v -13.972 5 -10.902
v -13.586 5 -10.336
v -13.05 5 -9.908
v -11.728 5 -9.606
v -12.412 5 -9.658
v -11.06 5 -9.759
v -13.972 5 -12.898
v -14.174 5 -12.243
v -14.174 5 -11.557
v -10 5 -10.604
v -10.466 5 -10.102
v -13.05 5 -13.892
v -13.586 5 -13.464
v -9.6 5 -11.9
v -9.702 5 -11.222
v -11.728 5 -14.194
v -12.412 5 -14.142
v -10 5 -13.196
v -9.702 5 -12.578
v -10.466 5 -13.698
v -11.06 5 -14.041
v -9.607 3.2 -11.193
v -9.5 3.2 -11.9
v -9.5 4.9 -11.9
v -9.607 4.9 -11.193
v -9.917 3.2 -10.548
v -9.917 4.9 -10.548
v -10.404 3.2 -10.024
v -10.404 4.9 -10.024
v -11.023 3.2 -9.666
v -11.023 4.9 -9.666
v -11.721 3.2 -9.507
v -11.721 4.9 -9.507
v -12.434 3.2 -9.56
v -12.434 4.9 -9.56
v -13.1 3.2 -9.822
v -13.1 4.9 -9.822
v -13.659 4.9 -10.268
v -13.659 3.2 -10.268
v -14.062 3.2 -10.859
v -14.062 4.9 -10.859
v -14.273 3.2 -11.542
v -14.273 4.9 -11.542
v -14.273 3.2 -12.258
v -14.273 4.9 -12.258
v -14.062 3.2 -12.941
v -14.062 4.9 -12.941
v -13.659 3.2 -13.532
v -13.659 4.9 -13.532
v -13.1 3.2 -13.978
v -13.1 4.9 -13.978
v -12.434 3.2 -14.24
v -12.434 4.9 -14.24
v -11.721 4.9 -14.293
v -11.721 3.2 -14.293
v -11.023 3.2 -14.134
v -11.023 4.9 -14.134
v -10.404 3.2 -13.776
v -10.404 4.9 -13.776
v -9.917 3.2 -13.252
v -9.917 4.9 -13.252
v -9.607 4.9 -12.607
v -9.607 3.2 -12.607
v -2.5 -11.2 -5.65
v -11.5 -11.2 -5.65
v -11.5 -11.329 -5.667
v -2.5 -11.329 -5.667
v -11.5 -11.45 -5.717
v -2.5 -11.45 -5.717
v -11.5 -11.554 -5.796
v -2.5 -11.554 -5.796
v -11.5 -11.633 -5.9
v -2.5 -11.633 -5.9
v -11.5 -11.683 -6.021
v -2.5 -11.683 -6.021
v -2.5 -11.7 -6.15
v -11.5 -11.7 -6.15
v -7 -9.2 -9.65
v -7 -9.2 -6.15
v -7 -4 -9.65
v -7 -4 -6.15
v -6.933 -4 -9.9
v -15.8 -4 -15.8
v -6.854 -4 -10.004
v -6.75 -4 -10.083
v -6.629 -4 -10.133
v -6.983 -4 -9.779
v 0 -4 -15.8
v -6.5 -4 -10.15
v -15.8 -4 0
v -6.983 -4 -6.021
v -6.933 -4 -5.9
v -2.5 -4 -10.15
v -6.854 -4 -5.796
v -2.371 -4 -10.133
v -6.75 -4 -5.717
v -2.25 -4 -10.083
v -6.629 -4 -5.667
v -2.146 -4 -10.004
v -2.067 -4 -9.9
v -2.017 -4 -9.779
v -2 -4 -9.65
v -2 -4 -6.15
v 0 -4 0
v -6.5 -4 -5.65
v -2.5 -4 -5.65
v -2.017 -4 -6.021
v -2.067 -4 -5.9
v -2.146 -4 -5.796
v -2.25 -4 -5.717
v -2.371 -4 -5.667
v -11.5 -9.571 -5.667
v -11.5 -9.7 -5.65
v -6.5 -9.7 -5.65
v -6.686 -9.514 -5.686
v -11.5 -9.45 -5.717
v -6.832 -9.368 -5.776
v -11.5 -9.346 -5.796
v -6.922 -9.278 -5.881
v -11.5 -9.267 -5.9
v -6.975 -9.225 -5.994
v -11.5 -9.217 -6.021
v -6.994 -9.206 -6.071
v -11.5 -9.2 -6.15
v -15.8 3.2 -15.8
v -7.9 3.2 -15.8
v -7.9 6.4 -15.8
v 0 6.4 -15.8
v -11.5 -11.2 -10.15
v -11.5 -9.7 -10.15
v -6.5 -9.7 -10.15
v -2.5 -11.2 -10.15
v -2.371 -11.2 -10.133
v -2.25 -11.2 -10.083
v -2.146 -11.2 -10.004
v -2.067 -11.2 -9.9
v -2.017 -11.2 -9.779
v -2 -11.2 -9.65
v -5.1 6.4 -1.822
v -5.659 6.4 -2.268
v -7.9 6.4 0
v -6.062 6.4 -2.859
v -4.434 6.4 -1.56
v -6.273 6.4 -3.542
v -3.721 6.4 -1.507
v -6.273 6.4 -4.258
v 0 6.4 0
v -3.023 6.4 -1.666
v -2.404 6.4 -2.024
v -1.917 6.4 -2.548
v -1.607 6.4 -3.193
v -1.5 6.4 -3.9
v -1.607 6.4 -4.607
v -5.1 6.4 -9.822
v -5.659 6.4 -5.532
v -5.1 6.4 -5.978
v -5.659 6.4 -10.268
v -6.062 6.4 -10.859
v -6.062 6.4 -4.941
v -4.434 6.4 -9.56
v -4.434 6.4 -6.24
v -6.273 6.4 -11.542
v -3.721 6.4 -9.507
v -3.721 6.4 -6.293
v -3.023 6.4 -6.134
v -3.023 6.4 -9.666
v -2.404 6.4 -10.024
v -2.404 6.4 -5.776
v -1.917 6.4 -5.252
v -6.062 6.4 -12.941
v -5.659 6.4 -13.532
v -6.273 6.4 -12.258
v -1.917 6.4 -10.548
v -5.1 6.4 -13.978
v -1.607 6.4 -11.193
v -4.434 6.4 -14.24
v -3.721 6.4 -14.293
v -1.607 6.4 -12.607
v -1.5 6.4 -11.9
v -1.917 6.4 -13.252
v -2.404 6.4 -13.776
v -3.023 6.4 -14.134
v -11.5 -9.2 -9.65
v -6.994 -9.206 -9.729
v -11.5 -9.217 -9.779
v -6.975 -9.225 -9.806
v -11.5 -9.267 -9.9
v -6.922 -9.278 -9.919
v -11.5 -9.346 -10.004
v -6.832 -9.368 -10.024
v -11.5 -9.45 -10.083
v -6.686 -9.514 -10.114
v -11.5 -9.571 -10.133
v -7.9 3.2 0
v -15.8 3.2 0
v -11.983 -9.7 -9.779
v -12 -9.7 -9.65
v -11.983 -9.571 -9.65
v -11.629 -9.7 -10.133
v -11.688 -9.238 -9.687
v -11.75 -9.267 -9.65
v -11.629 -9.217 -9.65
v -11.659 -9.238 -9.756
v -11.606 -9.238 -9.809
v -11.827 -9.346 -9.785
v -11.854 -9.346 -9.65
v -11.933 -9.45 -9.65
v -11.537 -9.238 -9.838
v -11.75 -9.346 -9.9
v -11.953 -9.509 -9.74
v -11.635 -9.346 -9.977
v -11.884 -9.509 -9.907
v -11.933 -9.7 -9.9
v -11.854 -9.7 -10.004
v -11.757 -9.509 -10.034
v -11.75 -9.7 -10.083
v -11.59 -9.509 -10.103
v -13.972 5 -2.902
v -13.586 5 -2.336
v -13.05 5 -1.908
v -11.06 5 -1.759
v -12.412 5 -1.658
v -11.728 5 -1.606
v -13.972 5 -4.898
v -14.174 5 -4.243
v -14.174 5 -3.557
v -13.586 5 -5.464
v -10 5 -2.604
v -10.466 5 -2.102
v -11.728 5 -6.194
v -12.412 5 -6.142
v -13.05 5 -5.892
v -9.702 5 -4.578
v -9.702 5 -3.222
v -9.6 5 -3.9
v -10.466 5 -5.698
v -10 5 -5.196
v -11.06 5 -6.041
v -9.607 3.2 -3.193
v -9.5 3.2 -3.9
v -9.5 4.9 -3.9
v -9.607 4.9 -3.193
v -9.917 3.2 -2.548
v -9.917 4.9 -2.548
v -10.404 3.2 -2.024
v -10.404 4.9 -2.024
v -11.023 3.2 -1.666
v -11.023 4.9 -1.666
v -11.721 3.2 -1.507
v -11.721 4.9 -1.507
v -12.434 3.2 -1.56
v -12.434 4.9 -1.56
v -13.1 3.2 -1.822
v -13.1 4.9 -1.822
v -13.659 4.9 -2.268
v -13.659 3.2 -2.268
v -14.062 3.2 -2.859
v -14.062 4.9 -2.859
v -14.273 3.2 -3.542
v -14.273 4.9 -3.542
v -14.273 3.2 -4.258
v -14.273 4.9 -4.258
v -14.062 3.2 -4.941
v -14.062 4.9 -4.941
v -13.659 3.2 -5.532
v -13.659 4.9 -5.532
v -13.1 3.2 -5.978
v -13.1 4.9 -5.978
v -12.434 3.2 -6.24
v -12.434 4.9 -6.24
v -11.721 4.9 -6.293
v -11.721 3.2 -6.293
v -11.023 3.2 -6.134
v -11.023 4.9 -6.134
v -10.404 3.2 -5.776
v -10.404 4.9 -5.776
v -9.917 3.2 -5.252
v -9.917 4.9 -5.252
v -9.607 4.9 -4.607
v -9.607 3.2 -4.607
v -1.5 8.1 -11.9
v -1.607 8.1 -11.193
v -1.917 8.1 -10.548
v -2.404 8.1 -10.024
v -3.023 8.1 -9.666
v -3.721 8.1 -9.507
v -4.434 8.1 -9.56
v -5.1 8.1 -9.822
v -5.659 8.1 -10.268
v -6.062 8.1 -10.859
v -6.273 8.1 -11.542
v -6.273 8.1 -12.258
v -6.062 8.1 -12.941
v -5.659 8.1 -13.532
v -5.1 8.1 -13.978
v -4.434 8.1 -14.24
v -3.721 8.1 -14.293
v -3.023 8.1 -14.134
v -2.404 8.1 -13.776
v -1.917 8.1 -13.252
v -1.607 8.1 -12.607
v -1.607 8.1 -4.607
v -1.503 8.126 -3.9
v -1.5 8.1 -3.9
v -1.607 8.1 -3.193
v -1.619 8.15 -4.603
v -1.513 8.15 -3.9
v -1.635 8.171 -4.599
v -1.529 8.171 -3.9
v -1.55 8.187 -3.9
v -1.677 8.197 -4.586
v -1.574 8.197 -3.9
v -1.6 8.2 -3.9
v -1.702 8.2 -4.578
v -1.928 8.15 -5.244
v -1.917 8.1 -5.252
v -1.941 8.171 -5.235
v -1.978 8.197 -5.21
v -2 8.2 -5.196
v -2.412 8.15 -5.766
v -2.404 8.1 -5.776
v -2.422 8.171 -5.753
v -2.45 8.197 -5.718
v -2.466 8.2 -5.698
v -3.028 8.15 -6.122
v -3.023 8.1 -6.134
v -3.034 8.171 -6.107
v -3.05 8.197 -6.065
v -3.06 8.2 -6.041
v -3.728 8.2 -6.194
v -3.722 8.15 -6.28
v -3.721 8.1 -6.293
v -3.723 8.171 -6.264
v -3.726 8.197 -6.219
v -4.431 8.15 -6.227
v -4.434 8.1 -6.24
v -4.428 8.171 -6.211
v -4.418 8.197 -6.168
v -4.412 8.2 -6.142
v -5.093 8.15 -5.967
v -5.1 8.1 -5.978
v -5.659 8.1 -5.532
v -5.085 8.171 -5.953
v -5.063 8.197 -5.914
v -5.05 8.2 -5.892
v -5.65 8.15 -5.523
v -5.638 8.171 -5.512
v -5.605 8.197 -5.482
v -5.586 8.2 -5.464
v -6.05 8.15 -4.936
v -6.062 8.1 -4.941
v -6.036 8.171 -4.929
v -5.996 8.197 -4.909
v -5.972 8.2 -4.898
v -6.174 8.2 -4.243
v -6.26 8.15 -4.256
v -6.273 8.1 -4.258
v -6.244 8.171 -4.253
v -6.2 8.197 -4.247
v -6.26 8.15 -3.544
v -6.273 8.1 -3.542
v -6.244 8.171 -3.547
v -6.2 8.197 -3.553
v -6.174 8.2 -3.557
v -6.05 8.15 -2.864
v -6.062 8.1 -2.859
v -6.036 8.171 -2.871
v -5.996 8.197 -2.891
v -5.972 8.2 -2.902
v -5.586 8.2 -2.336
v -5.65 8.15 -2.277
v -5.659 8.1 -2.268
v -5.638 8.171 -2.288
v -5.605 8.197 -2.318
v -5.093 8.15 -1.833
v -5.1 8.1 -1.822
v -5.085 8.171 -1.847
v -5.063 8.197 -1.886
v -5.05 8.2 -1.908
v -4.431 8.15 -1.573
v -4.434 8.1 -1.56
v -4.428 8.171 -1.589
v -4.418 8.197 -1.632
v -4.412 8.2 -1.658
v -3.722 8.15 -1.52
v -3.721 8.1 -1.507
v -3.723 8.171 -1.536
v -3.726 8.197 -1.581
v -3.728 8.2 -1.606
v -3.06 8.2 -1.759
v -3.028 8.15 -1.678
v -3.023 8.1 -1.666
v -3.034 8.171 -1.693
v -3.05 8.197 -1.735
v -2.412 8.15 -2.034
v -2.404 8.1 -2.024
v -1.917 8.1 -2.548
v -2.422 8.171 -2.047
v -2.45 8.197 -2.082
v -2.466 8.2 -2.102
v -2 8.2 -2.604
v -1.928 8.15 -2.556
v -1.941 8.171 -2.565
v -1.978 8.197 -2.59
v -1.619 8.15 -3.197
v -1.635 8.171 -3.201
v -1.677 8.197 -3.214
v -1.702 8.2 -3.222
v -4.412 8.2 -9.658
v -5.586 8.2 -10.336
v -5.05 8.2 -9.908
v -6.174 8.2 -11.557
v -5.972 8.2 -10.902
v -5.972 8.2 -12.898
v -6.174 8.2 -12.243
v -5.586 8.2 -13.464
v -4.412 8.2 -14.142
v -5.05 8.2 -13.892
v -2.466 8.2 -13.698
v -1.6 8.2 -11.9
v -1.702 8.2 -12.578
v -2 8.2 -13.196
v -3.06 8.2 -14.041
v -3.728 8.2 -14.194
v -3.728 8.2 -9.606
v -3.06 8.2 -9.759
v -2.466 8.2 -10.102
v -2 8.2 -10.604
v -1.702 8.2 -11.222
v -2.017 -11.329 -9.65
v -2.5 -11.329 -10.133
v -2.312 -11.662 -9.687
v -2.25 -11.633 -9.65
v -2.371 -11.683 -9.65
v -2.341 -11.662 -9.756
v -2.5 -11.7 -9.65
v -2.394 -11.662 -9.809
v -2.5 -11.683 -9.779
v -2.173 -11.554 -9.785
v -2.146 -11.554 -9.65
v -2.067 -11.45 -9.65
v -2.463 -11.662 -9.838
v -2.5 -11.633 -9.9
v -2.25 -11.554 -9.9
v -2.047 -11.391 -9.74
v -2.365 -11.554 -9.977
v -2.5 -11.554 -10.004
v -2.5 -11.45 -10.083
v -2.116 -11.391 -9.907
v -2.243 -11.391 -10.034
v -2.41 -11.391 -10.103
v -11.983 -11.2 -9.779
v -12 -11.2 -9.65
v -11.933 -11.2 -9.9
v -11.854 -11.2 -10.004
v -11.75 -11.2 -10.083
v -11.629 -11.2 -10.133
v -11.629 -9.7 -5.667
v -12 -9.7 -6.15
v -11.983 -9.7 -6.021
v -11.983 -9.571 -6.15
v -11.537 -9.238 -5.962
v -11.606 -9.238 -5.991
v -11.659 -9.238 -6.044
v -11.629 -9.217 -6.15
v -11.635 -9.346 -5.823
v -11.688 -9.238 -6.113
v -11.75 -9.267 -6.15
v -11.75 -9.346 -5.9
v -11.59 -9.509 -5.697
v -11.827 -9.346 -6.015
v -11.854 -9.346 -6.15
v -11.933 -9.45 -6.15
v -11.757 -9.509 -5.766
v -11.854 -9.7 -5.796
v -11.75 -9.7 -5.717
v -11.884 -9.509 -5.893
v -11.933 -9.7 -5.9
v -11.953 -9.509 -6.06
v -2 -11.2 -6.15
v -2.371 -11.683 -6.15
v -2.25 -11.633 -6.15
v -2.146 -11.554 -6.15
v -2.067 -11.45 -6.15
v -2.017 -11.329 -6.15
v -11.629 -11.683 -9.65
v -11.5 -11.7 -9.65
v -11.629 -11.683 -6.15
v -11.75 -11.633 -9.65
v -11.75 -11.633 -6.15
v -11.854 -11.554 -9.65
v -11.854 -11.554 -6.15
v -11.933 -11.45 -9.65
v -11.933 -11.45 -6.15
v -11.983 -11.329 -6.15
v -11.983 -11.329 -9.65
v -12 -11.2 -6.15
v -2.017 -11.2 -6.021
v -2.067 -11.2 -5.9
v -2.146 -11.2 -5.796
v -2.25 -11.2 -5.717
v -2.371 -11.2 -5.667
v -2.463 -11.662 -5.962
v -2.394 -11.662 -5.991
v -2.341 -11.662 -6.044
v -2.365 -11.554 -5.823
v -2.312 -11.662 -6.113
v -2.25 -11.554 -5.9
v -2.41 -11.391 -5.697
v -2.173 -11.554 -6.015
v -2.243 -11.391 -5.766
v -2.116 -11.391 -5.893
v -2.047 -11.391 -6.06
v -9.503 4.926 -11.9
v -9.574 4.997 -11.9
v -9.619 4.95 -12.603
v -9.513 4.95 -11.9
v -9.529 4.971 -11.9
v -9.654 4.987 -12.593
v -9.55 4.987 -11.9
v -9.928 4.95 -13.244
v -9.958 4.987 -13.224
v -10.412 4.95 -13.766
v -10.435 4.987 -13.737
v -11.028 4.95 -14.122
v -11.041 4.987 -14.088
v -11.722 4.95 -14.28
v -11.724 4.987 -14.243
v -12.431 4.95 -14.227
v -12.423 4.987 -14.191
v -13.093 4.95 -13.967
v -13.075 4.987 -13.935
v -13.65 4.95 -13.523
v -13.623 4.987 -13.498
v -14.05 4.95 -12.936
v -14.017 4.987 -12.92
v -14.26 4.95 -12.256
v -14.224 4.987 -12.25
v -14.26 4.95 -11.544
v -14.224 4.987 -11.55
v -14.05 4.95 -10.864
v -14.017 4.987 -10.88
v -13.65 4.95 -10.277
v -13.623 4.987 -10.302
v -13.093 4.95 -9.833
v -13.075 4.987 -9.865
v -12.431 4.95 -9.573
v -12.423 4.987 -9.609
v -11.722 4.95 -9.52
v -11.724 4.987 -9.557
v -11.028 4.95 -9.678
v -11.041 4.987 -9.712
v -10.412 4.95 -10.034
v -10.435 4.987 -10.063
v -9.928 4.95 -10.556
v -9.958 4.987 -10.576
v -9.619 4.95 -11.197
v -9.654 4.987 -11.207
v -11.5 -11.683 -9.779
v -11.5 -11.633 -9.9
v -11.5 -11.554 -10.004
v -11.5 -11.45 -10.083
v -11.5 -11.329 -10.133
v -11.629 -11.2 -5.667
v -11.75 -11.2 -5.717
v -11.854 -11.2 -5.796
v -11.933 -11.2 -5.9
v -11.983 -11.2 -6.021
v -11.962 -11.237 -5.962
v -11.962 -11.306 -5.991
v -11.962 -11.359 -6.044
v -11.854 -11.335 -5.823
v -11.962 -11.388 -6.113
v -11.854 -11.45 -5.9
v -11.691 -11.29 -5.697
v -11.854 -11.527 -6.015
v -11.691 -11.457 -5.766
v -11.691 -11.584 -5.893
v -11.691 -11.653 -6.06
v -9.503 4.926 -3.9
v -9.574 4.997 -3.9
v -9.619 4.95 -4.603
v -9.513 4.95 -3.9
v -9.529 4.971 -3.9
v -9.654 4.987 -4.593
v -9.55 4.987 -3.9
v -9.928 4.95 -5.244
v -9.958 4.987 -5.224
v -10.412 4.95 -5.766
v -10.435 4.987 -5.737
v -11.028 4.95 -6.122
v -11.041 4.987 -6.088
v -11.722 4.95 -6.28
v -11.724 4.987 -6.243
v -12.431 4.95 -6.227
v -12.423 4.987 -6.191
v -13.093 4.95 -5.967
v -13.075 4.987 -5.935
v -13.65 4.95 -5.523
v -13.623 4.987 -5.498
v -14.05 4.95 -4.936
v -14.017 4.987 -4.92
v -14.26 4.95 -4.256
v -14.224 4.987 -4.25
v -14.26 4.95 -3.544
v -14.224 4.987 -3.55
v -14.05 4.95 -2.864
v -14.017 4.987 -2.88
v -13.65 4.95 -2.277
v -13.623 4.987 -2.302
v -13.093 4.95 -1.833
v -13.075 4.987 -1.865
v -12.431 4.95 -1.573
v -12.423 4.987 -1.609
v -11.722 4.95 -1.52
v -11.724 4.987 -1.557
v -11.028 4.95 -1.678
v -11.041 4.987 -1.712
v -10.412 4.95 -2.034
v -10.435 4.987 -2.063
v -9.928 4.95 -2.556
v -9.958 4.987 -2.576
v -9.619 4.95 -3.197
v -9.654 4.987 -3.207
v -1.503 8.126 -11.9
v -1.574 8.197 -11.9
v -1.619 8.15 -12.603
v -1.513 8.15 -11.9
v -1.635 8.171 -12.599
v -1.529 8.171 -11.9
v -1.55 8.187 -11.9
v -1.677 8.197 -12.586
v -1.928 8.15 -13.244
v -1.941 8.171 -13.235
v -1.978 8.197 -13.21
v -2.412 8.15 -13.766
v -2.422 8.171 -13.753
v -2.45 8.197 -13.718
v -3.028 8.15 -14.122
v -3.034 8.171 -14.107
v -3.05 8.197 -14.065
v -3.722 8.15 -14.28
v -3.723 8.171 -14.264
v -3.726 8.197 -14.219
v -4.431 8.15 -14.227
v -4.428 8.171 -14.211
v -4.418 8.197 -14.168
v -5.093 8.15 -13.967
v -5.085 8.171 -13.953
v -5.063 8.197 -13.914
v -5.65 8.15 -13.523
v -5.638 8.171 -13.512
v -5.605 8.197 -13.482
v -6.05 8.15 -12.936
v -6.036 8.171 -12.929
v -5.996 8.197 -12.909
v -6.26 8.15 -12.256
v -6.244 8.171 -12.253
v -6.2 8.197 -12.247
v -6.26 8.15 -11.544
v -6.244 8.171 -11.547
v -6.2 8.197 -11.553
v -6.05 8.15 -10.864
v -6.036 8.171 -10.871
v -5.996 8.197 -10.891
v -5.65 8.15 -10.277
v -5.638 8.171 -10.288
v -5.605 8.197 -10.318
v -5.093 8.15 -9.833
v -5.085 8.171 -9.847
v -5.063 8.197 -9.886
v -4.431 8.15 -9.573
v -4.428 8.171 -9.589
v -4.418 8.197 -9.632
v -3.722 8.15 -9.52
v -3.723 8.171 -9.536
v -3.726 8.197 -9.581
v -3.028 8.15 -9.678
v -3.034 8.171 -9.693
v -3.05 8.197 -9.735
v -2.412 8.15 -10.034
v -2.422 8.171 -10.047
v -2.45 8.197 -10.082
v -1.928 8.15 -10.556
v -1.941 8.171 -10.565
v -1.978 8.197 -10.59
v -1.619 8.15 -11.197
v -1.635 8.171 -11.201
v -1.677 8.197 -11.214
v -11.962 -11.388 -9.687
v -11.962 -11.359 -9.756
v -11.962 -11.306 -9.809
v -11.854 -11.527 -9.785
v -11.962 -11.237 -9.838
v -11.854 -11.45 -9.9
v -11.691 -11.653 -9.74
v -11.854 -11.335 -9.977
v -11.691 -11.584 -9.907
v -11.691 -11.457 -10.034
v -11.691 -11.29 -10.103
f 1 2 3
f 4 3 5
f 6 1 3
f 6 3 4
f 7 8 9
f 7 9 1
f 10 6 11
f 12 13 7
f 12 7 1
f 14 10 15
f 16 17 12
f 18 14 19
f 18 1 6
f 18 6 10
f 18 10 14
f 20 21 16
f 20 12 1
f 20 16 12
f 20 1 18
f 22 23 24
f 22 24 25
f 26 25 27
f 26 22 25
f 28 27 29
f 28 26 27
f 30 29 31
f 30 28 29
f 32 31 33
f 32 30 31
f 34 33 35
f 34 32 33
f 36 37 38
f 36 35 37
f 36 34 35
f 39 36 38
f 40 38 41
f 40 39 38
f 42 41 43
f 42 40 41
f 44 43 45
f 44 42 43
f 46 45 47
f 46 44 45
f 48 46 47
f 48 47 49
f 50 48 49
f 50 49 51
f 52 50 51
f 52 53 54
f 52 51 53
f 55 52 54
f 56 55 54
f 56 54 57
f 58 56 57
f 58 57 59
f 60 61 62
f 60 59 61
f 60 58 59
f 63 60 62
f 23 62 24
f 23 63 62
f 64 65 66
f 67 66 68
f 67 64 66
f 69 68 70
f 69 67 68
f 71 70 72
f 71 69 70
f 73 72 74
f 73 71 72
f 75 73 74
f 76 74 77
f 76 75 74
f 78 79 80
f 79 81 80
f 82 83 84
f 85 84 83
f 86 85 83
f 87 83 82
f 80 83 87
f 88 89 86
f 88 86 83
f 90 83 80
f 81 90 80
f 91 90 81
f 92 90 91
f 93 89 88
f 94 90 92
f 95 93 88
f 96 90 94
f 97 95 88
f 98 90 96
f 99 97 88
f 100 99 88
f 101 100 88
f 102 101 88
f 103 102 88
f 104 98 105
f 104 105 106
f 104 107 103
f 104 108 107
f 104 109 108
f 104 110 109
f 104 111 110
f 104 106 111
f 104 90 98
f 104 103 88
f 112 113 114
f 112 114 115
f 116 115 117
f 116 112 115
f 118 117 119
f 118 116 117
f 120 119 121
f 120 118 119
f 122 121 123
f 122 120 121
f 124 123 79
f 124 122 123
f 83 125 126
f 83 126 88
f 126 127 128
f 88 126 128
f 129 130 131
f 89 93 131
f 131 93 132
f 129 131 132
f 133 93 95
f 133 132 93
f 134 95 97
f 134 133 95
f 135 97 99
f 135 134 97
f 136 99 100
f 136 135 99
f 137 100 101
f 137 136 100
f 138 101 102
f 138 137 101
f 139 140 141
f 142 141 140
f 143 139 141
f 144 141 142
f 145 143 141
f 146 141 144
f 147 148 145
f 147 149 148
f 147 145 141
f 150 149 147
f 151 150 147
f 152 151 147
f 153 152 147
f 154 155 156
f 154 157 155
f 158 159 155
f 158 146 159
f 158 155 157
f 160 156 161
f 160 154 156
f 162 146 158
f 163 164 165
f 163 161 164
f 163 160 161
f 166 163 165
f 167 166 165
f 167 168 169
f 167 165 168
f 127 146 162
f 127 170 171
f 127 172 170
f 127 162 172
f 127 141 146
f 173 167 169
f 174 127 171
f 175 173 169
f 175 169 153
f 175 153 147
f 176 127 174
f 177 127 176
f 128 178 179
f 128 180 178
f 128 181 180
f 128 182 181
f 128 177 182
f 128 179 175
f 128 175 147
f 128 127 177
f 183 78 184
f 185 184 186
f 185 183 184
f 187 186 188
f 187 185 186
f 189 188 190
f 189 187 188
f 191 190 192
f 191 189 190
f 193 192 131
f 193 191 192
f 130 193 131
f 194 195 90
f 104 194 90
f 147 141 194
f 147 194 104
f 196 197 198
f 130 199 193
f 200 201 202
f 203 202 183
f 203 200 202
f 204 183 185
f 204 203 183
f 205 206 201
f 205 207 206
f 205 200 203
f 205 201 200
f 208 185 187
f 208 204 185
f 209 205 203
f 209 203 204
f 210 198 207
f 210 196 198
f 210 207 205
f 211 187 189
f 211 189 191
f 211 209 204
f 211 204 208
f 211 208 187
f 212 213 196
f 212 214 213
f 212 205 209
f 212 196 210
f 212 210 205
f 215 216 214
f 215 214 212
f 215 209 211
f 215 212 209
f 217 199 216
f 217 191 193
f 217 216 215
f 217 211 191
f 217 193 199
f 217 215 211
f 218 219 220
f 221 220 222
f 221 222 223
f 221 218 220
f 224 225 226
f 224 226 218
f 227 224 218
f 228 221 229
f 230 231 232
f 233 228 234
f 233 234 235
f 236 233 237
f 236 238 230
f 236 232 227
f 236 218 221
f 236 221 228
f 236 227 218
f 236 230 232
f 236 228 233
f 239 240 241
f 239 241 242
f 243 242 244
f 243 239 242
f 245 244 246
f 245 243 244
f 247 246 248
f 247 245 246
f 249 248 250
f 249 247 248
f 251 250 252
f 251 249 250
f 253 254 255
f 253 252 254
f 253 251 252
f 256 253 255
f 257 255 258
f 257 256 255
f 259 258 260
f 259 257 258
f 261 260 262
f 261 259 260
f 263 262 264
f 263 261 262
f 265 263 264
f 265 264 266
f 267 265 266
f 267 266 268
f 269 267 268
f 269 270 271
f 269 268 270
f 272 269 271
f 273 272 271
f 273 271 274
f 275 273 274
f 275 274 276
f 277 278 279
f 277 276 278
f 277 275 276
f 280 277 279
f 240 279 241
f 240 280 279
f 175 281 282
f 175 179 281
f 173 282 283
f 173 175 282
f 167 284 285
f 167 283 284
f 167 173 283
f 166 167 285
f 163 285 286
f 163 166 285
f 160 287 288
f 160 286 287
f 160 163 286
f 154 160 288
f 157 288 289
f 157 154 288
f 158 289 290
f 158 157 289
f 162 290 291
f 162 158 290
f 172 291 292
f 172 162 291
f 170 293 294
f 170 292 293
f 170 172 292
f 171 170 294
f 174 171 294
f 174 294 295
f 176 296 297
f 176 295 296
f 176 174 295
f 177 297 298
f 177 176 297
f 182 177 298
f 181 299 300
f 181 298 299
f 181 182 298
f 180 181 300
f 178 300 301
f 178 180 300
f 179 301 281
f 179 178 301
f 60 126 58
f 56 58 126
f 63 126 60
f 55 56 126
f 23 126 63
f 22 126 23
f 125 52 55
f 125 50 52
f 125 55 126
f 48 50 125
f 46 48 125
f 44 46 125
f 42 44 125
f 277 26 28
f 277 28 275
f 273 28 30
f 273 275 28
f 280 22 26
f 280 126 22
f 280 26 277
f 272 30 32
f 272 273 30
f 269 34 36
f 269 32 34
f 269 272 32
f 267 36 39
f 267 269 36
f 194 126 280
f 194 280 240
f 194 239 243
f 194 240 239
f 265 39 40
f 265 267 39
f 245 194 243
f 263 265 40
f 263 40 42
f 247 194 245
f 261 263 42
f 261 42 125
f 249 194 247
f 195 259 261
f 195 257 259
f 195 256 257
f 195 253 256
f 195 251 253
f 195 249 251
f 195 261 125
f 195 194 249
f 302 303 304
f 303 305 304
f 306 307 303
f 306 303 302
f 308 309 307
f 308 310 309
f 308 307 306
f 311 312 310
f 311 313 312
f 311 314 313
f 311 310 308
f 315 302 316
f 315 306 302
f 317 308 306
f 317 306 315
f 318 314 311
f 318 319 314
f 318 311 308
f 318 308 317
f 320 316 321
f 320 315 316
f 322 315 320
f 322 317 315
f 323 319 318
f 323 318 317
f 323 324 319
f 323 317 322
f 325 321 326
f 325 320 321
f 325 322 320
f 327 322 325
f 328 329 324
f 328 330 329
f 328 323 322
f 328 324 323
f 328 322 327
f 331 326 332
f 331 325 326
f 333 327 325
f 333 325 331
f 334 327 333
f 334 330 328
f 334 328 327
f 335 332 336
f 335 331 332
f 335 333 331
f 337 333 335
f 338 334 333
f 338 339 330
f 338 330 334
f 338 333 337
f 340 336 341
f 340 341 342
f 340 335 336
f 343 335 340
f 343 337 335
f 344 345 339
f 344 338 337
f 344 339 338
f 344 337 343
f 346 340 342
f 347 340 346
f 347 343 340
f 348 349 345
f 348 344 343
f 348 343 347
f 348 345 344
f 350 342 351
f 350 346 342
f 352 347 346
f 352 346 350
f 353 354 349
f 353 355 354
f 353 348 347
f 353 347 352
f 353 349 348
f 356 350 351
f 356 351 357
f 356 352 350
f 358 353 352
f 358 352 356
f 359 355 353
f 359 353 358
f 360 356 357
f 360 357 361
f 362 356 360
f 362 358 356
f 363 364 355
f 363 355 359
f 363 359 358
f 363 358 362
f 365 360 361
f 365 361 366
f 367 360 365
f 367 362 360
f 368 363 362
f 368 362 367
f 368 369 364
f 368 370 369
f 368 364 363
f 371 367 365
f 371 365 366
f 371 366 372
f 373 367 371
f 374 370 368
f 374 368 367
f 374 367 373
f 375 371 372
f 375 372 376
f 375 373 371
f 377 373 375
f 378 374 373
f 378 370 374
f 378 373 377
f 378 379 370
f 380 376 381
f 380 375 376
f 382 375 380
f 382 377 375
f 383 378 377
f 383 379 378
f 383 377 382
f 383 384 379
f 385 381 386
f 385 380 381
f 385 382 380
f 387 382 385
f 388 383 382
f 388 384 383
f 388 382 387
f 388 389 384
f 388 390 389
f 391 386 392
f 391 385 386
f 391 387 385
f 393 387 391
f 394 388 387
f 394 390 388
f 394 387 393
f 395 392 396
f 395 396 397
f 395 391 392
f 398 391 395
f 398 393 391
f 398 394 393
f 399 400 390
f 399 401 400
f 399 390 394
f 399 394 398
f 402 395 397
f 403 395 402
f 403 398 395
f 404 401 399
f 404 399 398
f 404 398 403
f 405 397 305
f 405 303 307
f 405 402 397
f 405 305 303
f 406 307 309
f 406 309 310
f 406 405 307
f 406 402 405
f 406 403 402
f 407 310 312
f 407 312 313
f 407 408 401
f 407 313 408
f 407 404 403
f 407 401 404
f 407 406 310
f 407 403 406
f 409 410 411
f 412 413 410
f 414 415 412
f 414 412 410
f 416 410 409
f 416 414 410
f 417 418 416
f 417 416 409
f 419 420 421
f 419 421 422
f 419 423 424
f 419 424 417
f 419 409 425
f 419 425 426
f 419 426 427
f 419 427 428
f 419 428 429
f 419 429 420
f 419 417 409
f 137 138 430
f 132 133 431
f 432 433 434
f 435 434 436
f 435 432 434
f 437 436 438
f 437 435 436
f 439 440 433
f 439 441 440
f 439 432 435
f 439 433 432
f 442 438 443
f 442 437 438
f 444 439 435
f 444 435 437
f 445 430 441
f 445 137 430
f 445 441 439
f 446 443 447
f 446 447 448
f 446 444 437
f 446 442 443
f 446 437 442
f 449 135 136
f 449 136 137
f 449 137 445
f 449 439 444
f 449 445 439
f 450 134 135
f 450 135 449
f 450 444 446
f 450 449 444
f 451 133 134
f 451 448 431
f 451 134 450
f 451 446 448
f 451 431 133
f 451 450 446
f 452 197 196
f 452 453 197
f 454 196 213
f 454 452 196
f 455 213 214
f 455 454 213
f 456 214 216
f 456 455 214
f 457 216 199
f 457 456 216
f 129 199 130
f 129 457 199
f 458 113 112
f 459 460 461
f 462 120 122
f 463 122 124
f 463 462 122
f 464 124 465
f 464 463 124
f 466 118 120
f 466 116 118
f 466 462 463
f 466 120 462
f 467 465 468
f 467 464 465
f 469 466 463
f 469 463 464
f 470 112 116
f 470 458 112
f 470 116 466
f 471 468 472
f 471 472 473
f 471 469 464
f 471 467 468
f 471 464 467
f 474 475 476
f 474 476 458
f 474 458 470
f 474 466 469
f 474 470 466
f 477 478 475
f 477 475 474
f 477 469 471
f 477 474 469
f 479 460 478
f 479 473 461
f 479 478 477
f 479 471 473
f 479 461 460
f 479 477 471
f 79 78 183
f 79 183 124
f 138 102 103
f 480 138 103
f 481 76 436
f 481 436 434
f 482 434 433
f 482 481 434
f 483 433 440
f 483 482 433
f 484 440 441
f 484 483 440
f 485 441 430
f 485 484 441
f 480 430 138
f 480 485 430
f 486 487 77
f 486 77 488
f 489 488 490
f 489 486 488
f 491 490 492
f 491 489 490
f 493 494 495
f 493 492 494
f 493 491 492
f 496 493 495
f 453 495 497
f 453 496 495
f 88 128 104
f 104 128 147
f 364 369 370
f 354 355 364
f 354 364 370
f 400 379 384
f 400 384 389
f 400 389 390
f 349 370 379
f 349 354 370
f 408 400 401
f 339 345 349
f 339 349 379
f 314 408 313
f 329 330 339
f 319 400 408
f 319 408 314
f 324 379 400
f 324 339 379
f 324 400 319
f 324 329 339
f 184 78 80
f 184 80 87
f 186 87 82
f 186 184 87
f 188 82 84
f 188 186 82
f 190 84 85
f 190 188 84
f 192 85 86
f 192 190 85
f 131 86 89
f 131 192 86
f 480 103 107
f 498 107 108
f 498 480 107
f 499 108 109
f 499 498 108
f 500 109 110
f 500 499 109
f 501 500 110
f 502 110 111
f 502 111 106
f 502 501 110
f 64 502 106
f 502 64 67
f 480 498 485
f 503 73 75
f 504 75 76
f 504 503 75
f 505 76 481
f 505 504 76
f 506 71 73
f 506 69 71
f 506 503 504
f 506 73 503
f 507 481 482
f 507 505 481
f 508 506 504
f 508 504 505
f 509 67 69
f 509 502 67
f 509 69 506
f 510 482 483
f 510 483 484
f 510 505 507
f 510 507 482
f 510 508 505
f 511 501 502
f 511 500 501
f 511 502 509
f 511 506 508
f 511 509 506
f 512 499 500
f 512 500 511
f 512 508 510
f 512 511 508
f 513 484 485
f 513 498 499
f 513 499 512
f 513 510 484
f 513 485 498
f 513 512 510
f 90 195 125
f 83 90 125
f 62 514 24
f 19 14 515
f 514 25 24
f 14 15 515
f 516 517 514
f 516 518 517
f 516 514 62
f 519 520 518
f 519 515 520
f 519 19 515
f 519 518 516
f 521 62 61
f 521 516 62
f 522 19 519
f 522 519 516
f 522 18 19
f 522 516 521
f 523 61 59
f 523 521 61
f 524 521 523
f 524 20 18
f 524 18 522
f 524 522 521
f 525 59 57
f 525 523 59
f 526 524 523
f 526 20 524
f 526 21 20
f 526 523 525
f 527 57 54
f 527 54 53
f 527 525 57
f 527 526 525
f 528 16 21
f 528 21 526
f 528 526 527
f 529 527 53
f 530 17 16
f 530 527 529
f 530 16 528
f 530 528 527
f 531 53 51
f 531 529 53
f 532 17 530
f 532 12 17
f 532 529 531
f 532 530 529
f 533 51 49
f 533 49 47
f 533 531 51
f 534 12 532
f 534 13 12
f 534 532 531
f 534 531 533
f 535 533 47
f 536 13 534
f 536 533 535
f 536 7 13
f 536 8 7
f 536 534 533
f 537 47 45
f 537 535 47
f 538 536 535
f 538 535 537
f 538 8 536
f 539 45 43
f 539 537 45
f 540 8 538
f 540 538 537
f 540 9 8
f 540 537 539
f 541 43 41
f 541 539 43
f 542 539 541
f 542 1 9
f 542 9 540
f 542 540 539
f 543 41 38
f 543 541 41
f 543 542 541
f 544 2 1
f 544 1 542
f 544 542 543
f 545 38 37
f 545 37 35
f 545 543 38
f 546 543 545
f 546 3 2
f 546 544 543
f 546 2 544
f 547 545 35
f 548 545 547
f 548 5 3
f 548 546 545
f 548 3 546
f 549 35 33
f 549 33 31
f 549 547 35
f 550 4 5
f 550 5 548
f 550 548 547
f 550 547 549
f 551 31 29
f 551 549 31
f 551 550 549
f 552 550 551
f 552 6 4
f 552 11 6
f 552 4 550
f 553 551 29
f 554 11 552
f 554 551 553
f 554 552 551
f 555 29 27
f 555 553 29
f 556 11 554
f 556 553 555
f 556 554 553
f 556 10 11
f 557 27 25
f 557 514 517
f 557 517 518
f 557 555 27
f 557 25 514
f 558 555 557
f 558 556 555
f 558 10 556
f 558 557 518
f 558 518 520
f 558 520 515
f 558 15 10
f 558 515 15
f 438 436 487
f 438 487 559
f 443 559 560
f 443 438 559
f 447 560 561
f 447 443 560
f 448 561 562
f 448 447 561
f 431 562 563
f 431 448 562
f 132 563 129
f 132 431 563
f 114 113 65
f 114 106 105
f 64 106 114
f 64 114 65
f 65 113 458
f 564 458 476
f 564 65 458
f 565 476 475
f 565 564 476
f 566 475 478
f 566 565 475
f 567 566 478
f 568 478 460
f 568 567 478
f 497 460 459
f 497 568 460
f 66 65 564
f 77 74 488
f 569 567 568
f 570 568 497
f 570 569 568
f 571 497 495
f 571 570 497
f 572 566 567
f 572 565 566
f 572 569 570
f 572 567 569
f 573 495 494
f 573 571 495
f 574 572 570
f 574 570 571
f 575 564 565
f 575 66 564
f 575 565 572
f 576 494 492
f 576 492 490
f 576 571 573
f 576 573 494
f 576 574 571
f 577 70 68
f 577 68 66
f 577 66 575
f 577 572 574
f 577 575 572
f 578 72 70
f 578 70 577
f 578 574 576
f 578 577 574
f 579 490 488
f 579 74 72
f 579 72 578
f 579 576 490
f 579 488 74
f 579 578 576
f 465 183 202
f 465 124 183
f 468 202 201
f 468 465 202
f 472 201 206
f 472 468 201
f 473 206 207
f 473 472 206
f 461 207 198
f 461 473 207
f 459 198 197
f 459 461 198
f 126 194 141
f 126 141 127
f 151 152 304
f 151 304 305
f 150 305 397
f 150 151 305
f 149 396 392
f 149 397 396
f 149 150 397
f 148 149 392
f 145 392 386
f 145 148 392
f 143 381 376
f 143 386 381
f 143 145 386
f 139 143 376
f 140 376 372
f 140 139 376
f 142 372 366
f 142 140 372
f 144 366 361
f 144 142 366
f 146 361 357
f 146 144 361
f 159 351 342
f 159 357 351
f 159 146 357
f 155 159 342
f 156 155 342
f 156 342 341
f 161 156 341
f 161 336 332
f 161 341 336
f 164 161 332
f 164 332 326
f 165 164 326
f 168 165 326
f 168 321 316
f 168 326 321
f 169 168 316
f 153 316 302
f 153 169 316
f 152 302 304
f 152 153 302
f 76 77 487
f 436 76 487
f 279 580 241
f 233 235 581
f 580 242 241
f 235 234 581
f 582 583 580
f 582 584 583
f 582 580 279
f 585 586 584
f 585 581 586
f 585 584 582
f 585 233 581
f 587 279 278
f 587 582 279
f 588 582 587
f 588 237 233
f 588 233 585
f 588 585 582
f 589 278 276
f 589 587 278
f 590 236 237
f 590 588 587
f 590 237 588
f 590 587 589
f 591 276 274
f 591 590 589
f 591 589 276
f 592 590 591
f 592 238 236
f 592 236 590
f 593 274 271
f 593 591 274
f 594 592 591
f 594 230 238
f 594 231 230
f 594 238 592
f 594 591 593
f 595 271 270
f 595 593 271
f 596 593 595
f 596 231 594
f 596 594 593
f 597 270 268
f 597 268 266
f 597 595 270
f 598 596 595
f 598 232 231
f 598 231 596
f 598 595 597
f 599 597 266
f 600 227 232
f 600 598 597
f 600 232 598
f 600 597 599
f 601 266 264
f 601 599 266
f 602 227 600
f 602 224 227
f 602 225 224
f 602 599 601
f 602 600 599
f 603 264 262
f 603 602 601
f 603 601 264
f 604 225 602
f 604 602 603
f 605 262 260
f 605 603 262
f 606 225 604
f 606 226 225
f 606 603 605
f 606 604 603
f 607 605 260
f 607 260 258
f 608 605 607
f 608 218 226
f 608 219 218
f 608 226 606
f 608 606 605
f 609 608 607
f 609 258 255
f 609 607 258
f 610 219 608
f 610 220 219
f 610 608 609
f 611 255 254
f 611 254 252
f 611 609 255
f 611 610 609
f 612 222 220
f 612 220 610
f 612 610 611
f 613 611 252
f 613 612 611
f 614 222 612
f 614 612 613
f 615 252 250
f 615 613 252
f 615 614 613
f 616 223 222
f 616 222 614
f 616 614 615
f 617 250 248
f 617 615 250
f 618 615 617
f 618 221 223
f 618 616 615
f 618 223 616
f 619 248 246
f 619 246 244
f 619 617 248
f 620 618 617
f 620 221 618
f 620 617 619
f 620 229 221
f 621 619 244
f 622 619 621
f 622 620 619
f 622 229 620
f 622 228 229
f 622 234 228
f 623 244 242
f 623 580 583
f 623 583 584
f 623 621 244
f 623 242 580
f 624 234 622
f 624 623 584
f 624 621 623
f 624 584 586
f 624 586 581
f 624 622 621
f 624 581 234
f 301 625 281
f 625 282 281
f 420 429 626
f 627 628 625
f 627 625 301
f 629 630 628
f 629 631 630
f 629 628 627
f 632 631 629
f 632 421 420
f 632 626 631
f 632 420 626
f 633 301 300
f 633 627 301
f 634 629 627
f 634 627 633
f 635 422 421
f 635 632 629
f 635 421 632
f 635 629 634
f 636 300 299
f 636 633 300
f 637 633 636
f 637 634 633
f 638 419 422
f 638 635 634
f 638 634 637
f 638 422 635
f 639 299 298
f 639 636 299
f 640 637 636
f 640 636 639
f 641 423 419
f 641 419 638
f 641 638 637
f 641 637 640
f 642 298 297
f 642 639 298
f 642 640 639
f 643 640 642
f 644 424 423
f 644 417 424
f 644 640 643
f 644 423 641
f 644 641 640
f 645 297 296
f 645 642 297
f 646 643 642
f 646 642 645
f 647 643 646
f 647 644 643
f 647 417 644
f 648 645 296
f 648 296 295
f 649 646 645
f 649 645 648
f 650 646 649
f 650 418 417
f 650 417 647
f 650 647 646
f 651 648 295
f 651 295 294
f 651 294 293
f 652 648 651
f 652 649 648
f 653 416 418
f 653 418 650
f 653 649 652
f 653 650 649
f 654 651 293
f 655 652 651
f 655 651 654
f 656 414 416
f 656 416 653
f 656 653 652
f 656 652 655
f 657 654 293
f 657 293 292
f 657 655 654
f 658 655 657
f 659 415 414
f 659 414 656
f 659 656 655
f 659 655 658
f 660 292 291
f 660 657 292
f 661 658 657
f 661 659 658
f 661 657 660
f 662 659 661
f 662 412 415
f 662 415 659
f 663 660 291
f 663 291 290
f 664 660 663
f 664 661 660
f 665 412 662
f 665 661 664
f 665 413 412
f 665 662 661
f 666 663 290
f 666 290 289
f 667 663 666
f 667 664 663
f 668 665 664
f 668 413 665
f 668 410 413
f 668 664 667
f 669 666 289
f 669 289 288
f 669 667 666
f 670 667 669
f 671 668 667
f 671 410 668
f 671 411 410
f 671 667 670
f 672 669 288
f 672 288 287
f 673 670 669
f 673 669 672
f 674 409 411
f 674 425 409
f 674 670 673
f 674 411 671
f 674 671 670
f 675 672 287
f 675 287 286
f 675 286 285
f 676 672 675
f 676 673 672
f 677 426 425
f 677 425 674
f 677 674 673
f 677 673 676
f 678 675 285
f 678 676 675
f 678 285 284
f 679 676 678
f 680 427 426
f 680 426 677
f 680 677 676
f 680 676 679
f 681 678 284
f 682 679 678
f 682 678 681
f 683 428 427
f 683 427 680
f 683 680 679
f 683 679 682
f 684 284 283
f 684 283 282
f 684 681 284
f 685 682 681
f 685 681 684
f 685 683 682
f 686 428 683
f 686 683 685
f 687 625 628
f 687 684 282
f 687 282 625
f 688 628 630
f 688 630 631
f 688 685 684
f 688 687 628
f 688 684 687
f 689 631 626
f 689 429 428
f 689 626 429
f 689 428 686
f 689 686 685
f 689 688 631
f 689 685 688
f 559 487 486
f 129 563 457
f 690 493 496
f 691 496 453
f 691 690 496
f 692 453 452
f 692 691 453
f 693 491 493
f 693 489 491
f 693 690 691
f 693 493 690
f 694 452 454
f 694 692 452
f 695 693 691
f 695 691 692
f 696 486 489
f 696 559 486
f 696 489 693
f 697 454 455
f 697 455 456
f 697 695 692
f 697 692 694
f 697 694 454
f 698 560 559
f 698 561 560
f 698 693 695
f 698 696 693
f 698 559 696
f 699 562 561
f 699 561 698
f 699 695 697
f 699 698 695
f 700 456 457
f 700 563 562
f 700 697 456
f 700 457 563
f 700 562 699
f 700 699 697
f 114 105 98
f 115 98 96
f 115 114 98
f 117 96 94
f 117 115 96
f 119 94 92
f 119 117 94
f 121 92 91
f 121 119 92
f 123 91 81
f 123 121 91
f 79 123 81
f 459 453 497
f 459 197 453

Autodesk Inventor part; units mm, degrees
ref_plane "YZ Plane" through (0, 0, 0) normal (1, 0, 0) x (0, 1, 0)
ref_plane "XZ Plane" through (0, 0, 0) normal (0, 1, 0) x (-1, 0, 0)
ref_plane "XY Plane" through (0, 0, 0) normal (0, 0, 1) x (1, 0, 0)
sketch "Sketch1" plane through (0, 0, 0) normal (0, 1, 0) x (-1, 0, 0)
  line L0 (0, 0) -> (15.8, 0)
  line L1 (15.8, 0) -> (15.8, -15.8)
  line L2 (15.8, -15.8) -> (0, -15.8)
  line L3 (0, -15.8) -> (0, 0)
  dimension "d0" = 15.8
  dimension "d1" = 15.8
extrude "Extrusion1" add sketch "Sketch1" along normal blind 3.2
sketch "Sketch2" plane through (0, 3.2, 0) normal (0, 1, 0) x (1, 0, 0)
  line L0 (-15.8, 0) -> (0, 0) projected
  line L1 (0, 15.8) -> (-15.8, 15.8) projected
  line L2 (0, 0) -> (-7.9, 0)
  line L3 (-7.9, 0) -> (-7.9, 15.8)
  line L4 (-7.9, 15.8) -> (0, 15.8)
  line L5 (0, 15.8) -> (0, 0)
  dimension "d4" = 7.9
extrude "Extrusion2" add sketch "Sketch2" along normal blind 3.2
sketch "Sketch3" plane through (0, 6.4, 0) normal (0, 1, 0) x (1, 0, 0)
  circle A0 centre (-3.9, 11.9) radius 2.4
  line L0 (0, 15.8) -> (-7.9, 15.8) projected
  line L1 (0, 0) -> (0, 15.8) projected
  line L2 (0, 7.9) -> (-7.9, 7.9) construction
  line L3 (-7.9, 15.8) -> (-7.9, 0) construction
  circle A1 centre (-3.9, 3.9) radius 2.4
  dimension "d7" = 4.8
  dimension "d8" = 3.9
  dimension "d9" = 3.9
  dimension "d10" = 8
sketch "Sketch4" plane through (0, 3.2, 0) normal (0, 1, 0) x (1, 0, 0)
  circle A0 centre (-11.9, 11.9) radius 2.4
  line L0 (-7.9, 15.8) -> (-15.8, 15.8) projected
  line L1 (-15.8, 15.8) -> (-15.8, 0) projected
  line L2 (-7.9, 15.8) -> (-7.9, 0) construction
  line L3 (-7.9, 7.9) -> (-15.8, 7.9) construction
  circle A1 centre (-11.9, 3.9) radius 2.4
  point P0 (0, 0)
  dimension "d11" = 4.8
  dimension "d12" = 3.9
  dimension "d13" = 3.9
extrude "Extrusion3" add sketch "Sketch4" along normal blind 1.8
extrude "Extrusion4" add sketch "Sketch3" along normal blind 1.8
sketch "Sketch5" plane through (0, 0, 0) normal (0, -1, 0) x (1, 0, 0)
  point P0 (0, 0)
sketch "Sketch6" plane through (0, 0, 0) normal (0, -1, 0) x (1, 0, 0)
  point P0 (0, 0)
sketch "Sketch7" plane through (0, 0, 0) normal (0, -1, 0) x (1, 0, 0)
  line L0 (-7.9, 0) -> (0, 0) projected
  line L1 (0, 0) -> (-15.8, 0)
  line L2 (-15.8, 0) -> (-15.8, -15.8)
  line L3 (-15.8, -15.8) -> (0, -15.8)
  line L4 (0, -15.8) -> (0, 0)
extrude "Extrusion5" add sketch "Sketch7" along normal blind 4
sketch "Sketch8" plane through (0, -4, 0) normal (0, -1, 0) x (1, 0, 0)
  line L0 (-2, -5.65) -> (-7, -5.65)
  line L1 (-7, -5.65) -> (-7, -10.15)
  line L2 (-7, -10.15) -> (-2, -10.15)
  line L3 (-2, -10.15) -> (-2, -5.65)
  line L4 (0, 0) -> (0, -15.8) construction
  line L5 (0, -7.9) -> (-15.8, -7.9) construction
  line L6 (-15.8, -15.8) -> (-15.8, 0) construction
  point P0 (-2, -7.9)
  dimension "d20" = 4.5
  dimension "d21" = 5
  dimension "d22" = 0
  dimension "d24" = 7
extrude "Extrusion6" add sketch "Sketch8" along normal blind 7.7
sketch "Sketch9" plane through (-7, -4, -10.15) normal (-1, 0, 0) x (0, 0, 1)
  point P0 (10.15, 4)
sketch "Sketch10" plane through (-7, -4, -10.15) normal (-1, 0, 0) x (0, 0, 1)
  line L0 (4.5, 0) -> (4.5, -7.7) projected
  line L1 (0, 0) -> (0, -7.7) projected
  line L2 (4.5, -7.7) -> (0, -7.7)
  line L3 (0, -7.7) -> (0, -5.2)
  line L4 (0, -5.2) -> (4.5, -5.2)
  line L5 (4.5, -5.2) -> (4.5, -7.7)
  point P0 (10.15, 4)
  point P1 (0, -7.7)
  point P2 (4.5, -5.2)
  dimension "d27" = 2.5
extrude "Extrusion7" add sketch "Sketch10" along normal blind 5
fillet "Fillet1" radius 0.1 4 edges at (-6.3, 8.2, -3.9) (-14.3, 5, -3.9) (-14.3, 5, -11.9) (-6.3, 8.2, -11.9)
fillet "Fillet2" radius 0.5 13 edges at (-2, -7.85, -5.65) (-2, -7.85, -10.15) (-7, -11.7, -5.65) (-7, -11.7, -10.15) (-12, -11.7, -7.9) (-12, -10.45, -10.15) (-12, -10.45, -5.65) (-12, -9.2, -7.9) (-9.5, -9.2, -5.65) (-9.5, -9.2, -10.15) (-7, -6.6, -10.15) (-7, -6.6, -5.65) (-2, -11.7, -7.9)
properties part number "LEGO_hanging_brick"
